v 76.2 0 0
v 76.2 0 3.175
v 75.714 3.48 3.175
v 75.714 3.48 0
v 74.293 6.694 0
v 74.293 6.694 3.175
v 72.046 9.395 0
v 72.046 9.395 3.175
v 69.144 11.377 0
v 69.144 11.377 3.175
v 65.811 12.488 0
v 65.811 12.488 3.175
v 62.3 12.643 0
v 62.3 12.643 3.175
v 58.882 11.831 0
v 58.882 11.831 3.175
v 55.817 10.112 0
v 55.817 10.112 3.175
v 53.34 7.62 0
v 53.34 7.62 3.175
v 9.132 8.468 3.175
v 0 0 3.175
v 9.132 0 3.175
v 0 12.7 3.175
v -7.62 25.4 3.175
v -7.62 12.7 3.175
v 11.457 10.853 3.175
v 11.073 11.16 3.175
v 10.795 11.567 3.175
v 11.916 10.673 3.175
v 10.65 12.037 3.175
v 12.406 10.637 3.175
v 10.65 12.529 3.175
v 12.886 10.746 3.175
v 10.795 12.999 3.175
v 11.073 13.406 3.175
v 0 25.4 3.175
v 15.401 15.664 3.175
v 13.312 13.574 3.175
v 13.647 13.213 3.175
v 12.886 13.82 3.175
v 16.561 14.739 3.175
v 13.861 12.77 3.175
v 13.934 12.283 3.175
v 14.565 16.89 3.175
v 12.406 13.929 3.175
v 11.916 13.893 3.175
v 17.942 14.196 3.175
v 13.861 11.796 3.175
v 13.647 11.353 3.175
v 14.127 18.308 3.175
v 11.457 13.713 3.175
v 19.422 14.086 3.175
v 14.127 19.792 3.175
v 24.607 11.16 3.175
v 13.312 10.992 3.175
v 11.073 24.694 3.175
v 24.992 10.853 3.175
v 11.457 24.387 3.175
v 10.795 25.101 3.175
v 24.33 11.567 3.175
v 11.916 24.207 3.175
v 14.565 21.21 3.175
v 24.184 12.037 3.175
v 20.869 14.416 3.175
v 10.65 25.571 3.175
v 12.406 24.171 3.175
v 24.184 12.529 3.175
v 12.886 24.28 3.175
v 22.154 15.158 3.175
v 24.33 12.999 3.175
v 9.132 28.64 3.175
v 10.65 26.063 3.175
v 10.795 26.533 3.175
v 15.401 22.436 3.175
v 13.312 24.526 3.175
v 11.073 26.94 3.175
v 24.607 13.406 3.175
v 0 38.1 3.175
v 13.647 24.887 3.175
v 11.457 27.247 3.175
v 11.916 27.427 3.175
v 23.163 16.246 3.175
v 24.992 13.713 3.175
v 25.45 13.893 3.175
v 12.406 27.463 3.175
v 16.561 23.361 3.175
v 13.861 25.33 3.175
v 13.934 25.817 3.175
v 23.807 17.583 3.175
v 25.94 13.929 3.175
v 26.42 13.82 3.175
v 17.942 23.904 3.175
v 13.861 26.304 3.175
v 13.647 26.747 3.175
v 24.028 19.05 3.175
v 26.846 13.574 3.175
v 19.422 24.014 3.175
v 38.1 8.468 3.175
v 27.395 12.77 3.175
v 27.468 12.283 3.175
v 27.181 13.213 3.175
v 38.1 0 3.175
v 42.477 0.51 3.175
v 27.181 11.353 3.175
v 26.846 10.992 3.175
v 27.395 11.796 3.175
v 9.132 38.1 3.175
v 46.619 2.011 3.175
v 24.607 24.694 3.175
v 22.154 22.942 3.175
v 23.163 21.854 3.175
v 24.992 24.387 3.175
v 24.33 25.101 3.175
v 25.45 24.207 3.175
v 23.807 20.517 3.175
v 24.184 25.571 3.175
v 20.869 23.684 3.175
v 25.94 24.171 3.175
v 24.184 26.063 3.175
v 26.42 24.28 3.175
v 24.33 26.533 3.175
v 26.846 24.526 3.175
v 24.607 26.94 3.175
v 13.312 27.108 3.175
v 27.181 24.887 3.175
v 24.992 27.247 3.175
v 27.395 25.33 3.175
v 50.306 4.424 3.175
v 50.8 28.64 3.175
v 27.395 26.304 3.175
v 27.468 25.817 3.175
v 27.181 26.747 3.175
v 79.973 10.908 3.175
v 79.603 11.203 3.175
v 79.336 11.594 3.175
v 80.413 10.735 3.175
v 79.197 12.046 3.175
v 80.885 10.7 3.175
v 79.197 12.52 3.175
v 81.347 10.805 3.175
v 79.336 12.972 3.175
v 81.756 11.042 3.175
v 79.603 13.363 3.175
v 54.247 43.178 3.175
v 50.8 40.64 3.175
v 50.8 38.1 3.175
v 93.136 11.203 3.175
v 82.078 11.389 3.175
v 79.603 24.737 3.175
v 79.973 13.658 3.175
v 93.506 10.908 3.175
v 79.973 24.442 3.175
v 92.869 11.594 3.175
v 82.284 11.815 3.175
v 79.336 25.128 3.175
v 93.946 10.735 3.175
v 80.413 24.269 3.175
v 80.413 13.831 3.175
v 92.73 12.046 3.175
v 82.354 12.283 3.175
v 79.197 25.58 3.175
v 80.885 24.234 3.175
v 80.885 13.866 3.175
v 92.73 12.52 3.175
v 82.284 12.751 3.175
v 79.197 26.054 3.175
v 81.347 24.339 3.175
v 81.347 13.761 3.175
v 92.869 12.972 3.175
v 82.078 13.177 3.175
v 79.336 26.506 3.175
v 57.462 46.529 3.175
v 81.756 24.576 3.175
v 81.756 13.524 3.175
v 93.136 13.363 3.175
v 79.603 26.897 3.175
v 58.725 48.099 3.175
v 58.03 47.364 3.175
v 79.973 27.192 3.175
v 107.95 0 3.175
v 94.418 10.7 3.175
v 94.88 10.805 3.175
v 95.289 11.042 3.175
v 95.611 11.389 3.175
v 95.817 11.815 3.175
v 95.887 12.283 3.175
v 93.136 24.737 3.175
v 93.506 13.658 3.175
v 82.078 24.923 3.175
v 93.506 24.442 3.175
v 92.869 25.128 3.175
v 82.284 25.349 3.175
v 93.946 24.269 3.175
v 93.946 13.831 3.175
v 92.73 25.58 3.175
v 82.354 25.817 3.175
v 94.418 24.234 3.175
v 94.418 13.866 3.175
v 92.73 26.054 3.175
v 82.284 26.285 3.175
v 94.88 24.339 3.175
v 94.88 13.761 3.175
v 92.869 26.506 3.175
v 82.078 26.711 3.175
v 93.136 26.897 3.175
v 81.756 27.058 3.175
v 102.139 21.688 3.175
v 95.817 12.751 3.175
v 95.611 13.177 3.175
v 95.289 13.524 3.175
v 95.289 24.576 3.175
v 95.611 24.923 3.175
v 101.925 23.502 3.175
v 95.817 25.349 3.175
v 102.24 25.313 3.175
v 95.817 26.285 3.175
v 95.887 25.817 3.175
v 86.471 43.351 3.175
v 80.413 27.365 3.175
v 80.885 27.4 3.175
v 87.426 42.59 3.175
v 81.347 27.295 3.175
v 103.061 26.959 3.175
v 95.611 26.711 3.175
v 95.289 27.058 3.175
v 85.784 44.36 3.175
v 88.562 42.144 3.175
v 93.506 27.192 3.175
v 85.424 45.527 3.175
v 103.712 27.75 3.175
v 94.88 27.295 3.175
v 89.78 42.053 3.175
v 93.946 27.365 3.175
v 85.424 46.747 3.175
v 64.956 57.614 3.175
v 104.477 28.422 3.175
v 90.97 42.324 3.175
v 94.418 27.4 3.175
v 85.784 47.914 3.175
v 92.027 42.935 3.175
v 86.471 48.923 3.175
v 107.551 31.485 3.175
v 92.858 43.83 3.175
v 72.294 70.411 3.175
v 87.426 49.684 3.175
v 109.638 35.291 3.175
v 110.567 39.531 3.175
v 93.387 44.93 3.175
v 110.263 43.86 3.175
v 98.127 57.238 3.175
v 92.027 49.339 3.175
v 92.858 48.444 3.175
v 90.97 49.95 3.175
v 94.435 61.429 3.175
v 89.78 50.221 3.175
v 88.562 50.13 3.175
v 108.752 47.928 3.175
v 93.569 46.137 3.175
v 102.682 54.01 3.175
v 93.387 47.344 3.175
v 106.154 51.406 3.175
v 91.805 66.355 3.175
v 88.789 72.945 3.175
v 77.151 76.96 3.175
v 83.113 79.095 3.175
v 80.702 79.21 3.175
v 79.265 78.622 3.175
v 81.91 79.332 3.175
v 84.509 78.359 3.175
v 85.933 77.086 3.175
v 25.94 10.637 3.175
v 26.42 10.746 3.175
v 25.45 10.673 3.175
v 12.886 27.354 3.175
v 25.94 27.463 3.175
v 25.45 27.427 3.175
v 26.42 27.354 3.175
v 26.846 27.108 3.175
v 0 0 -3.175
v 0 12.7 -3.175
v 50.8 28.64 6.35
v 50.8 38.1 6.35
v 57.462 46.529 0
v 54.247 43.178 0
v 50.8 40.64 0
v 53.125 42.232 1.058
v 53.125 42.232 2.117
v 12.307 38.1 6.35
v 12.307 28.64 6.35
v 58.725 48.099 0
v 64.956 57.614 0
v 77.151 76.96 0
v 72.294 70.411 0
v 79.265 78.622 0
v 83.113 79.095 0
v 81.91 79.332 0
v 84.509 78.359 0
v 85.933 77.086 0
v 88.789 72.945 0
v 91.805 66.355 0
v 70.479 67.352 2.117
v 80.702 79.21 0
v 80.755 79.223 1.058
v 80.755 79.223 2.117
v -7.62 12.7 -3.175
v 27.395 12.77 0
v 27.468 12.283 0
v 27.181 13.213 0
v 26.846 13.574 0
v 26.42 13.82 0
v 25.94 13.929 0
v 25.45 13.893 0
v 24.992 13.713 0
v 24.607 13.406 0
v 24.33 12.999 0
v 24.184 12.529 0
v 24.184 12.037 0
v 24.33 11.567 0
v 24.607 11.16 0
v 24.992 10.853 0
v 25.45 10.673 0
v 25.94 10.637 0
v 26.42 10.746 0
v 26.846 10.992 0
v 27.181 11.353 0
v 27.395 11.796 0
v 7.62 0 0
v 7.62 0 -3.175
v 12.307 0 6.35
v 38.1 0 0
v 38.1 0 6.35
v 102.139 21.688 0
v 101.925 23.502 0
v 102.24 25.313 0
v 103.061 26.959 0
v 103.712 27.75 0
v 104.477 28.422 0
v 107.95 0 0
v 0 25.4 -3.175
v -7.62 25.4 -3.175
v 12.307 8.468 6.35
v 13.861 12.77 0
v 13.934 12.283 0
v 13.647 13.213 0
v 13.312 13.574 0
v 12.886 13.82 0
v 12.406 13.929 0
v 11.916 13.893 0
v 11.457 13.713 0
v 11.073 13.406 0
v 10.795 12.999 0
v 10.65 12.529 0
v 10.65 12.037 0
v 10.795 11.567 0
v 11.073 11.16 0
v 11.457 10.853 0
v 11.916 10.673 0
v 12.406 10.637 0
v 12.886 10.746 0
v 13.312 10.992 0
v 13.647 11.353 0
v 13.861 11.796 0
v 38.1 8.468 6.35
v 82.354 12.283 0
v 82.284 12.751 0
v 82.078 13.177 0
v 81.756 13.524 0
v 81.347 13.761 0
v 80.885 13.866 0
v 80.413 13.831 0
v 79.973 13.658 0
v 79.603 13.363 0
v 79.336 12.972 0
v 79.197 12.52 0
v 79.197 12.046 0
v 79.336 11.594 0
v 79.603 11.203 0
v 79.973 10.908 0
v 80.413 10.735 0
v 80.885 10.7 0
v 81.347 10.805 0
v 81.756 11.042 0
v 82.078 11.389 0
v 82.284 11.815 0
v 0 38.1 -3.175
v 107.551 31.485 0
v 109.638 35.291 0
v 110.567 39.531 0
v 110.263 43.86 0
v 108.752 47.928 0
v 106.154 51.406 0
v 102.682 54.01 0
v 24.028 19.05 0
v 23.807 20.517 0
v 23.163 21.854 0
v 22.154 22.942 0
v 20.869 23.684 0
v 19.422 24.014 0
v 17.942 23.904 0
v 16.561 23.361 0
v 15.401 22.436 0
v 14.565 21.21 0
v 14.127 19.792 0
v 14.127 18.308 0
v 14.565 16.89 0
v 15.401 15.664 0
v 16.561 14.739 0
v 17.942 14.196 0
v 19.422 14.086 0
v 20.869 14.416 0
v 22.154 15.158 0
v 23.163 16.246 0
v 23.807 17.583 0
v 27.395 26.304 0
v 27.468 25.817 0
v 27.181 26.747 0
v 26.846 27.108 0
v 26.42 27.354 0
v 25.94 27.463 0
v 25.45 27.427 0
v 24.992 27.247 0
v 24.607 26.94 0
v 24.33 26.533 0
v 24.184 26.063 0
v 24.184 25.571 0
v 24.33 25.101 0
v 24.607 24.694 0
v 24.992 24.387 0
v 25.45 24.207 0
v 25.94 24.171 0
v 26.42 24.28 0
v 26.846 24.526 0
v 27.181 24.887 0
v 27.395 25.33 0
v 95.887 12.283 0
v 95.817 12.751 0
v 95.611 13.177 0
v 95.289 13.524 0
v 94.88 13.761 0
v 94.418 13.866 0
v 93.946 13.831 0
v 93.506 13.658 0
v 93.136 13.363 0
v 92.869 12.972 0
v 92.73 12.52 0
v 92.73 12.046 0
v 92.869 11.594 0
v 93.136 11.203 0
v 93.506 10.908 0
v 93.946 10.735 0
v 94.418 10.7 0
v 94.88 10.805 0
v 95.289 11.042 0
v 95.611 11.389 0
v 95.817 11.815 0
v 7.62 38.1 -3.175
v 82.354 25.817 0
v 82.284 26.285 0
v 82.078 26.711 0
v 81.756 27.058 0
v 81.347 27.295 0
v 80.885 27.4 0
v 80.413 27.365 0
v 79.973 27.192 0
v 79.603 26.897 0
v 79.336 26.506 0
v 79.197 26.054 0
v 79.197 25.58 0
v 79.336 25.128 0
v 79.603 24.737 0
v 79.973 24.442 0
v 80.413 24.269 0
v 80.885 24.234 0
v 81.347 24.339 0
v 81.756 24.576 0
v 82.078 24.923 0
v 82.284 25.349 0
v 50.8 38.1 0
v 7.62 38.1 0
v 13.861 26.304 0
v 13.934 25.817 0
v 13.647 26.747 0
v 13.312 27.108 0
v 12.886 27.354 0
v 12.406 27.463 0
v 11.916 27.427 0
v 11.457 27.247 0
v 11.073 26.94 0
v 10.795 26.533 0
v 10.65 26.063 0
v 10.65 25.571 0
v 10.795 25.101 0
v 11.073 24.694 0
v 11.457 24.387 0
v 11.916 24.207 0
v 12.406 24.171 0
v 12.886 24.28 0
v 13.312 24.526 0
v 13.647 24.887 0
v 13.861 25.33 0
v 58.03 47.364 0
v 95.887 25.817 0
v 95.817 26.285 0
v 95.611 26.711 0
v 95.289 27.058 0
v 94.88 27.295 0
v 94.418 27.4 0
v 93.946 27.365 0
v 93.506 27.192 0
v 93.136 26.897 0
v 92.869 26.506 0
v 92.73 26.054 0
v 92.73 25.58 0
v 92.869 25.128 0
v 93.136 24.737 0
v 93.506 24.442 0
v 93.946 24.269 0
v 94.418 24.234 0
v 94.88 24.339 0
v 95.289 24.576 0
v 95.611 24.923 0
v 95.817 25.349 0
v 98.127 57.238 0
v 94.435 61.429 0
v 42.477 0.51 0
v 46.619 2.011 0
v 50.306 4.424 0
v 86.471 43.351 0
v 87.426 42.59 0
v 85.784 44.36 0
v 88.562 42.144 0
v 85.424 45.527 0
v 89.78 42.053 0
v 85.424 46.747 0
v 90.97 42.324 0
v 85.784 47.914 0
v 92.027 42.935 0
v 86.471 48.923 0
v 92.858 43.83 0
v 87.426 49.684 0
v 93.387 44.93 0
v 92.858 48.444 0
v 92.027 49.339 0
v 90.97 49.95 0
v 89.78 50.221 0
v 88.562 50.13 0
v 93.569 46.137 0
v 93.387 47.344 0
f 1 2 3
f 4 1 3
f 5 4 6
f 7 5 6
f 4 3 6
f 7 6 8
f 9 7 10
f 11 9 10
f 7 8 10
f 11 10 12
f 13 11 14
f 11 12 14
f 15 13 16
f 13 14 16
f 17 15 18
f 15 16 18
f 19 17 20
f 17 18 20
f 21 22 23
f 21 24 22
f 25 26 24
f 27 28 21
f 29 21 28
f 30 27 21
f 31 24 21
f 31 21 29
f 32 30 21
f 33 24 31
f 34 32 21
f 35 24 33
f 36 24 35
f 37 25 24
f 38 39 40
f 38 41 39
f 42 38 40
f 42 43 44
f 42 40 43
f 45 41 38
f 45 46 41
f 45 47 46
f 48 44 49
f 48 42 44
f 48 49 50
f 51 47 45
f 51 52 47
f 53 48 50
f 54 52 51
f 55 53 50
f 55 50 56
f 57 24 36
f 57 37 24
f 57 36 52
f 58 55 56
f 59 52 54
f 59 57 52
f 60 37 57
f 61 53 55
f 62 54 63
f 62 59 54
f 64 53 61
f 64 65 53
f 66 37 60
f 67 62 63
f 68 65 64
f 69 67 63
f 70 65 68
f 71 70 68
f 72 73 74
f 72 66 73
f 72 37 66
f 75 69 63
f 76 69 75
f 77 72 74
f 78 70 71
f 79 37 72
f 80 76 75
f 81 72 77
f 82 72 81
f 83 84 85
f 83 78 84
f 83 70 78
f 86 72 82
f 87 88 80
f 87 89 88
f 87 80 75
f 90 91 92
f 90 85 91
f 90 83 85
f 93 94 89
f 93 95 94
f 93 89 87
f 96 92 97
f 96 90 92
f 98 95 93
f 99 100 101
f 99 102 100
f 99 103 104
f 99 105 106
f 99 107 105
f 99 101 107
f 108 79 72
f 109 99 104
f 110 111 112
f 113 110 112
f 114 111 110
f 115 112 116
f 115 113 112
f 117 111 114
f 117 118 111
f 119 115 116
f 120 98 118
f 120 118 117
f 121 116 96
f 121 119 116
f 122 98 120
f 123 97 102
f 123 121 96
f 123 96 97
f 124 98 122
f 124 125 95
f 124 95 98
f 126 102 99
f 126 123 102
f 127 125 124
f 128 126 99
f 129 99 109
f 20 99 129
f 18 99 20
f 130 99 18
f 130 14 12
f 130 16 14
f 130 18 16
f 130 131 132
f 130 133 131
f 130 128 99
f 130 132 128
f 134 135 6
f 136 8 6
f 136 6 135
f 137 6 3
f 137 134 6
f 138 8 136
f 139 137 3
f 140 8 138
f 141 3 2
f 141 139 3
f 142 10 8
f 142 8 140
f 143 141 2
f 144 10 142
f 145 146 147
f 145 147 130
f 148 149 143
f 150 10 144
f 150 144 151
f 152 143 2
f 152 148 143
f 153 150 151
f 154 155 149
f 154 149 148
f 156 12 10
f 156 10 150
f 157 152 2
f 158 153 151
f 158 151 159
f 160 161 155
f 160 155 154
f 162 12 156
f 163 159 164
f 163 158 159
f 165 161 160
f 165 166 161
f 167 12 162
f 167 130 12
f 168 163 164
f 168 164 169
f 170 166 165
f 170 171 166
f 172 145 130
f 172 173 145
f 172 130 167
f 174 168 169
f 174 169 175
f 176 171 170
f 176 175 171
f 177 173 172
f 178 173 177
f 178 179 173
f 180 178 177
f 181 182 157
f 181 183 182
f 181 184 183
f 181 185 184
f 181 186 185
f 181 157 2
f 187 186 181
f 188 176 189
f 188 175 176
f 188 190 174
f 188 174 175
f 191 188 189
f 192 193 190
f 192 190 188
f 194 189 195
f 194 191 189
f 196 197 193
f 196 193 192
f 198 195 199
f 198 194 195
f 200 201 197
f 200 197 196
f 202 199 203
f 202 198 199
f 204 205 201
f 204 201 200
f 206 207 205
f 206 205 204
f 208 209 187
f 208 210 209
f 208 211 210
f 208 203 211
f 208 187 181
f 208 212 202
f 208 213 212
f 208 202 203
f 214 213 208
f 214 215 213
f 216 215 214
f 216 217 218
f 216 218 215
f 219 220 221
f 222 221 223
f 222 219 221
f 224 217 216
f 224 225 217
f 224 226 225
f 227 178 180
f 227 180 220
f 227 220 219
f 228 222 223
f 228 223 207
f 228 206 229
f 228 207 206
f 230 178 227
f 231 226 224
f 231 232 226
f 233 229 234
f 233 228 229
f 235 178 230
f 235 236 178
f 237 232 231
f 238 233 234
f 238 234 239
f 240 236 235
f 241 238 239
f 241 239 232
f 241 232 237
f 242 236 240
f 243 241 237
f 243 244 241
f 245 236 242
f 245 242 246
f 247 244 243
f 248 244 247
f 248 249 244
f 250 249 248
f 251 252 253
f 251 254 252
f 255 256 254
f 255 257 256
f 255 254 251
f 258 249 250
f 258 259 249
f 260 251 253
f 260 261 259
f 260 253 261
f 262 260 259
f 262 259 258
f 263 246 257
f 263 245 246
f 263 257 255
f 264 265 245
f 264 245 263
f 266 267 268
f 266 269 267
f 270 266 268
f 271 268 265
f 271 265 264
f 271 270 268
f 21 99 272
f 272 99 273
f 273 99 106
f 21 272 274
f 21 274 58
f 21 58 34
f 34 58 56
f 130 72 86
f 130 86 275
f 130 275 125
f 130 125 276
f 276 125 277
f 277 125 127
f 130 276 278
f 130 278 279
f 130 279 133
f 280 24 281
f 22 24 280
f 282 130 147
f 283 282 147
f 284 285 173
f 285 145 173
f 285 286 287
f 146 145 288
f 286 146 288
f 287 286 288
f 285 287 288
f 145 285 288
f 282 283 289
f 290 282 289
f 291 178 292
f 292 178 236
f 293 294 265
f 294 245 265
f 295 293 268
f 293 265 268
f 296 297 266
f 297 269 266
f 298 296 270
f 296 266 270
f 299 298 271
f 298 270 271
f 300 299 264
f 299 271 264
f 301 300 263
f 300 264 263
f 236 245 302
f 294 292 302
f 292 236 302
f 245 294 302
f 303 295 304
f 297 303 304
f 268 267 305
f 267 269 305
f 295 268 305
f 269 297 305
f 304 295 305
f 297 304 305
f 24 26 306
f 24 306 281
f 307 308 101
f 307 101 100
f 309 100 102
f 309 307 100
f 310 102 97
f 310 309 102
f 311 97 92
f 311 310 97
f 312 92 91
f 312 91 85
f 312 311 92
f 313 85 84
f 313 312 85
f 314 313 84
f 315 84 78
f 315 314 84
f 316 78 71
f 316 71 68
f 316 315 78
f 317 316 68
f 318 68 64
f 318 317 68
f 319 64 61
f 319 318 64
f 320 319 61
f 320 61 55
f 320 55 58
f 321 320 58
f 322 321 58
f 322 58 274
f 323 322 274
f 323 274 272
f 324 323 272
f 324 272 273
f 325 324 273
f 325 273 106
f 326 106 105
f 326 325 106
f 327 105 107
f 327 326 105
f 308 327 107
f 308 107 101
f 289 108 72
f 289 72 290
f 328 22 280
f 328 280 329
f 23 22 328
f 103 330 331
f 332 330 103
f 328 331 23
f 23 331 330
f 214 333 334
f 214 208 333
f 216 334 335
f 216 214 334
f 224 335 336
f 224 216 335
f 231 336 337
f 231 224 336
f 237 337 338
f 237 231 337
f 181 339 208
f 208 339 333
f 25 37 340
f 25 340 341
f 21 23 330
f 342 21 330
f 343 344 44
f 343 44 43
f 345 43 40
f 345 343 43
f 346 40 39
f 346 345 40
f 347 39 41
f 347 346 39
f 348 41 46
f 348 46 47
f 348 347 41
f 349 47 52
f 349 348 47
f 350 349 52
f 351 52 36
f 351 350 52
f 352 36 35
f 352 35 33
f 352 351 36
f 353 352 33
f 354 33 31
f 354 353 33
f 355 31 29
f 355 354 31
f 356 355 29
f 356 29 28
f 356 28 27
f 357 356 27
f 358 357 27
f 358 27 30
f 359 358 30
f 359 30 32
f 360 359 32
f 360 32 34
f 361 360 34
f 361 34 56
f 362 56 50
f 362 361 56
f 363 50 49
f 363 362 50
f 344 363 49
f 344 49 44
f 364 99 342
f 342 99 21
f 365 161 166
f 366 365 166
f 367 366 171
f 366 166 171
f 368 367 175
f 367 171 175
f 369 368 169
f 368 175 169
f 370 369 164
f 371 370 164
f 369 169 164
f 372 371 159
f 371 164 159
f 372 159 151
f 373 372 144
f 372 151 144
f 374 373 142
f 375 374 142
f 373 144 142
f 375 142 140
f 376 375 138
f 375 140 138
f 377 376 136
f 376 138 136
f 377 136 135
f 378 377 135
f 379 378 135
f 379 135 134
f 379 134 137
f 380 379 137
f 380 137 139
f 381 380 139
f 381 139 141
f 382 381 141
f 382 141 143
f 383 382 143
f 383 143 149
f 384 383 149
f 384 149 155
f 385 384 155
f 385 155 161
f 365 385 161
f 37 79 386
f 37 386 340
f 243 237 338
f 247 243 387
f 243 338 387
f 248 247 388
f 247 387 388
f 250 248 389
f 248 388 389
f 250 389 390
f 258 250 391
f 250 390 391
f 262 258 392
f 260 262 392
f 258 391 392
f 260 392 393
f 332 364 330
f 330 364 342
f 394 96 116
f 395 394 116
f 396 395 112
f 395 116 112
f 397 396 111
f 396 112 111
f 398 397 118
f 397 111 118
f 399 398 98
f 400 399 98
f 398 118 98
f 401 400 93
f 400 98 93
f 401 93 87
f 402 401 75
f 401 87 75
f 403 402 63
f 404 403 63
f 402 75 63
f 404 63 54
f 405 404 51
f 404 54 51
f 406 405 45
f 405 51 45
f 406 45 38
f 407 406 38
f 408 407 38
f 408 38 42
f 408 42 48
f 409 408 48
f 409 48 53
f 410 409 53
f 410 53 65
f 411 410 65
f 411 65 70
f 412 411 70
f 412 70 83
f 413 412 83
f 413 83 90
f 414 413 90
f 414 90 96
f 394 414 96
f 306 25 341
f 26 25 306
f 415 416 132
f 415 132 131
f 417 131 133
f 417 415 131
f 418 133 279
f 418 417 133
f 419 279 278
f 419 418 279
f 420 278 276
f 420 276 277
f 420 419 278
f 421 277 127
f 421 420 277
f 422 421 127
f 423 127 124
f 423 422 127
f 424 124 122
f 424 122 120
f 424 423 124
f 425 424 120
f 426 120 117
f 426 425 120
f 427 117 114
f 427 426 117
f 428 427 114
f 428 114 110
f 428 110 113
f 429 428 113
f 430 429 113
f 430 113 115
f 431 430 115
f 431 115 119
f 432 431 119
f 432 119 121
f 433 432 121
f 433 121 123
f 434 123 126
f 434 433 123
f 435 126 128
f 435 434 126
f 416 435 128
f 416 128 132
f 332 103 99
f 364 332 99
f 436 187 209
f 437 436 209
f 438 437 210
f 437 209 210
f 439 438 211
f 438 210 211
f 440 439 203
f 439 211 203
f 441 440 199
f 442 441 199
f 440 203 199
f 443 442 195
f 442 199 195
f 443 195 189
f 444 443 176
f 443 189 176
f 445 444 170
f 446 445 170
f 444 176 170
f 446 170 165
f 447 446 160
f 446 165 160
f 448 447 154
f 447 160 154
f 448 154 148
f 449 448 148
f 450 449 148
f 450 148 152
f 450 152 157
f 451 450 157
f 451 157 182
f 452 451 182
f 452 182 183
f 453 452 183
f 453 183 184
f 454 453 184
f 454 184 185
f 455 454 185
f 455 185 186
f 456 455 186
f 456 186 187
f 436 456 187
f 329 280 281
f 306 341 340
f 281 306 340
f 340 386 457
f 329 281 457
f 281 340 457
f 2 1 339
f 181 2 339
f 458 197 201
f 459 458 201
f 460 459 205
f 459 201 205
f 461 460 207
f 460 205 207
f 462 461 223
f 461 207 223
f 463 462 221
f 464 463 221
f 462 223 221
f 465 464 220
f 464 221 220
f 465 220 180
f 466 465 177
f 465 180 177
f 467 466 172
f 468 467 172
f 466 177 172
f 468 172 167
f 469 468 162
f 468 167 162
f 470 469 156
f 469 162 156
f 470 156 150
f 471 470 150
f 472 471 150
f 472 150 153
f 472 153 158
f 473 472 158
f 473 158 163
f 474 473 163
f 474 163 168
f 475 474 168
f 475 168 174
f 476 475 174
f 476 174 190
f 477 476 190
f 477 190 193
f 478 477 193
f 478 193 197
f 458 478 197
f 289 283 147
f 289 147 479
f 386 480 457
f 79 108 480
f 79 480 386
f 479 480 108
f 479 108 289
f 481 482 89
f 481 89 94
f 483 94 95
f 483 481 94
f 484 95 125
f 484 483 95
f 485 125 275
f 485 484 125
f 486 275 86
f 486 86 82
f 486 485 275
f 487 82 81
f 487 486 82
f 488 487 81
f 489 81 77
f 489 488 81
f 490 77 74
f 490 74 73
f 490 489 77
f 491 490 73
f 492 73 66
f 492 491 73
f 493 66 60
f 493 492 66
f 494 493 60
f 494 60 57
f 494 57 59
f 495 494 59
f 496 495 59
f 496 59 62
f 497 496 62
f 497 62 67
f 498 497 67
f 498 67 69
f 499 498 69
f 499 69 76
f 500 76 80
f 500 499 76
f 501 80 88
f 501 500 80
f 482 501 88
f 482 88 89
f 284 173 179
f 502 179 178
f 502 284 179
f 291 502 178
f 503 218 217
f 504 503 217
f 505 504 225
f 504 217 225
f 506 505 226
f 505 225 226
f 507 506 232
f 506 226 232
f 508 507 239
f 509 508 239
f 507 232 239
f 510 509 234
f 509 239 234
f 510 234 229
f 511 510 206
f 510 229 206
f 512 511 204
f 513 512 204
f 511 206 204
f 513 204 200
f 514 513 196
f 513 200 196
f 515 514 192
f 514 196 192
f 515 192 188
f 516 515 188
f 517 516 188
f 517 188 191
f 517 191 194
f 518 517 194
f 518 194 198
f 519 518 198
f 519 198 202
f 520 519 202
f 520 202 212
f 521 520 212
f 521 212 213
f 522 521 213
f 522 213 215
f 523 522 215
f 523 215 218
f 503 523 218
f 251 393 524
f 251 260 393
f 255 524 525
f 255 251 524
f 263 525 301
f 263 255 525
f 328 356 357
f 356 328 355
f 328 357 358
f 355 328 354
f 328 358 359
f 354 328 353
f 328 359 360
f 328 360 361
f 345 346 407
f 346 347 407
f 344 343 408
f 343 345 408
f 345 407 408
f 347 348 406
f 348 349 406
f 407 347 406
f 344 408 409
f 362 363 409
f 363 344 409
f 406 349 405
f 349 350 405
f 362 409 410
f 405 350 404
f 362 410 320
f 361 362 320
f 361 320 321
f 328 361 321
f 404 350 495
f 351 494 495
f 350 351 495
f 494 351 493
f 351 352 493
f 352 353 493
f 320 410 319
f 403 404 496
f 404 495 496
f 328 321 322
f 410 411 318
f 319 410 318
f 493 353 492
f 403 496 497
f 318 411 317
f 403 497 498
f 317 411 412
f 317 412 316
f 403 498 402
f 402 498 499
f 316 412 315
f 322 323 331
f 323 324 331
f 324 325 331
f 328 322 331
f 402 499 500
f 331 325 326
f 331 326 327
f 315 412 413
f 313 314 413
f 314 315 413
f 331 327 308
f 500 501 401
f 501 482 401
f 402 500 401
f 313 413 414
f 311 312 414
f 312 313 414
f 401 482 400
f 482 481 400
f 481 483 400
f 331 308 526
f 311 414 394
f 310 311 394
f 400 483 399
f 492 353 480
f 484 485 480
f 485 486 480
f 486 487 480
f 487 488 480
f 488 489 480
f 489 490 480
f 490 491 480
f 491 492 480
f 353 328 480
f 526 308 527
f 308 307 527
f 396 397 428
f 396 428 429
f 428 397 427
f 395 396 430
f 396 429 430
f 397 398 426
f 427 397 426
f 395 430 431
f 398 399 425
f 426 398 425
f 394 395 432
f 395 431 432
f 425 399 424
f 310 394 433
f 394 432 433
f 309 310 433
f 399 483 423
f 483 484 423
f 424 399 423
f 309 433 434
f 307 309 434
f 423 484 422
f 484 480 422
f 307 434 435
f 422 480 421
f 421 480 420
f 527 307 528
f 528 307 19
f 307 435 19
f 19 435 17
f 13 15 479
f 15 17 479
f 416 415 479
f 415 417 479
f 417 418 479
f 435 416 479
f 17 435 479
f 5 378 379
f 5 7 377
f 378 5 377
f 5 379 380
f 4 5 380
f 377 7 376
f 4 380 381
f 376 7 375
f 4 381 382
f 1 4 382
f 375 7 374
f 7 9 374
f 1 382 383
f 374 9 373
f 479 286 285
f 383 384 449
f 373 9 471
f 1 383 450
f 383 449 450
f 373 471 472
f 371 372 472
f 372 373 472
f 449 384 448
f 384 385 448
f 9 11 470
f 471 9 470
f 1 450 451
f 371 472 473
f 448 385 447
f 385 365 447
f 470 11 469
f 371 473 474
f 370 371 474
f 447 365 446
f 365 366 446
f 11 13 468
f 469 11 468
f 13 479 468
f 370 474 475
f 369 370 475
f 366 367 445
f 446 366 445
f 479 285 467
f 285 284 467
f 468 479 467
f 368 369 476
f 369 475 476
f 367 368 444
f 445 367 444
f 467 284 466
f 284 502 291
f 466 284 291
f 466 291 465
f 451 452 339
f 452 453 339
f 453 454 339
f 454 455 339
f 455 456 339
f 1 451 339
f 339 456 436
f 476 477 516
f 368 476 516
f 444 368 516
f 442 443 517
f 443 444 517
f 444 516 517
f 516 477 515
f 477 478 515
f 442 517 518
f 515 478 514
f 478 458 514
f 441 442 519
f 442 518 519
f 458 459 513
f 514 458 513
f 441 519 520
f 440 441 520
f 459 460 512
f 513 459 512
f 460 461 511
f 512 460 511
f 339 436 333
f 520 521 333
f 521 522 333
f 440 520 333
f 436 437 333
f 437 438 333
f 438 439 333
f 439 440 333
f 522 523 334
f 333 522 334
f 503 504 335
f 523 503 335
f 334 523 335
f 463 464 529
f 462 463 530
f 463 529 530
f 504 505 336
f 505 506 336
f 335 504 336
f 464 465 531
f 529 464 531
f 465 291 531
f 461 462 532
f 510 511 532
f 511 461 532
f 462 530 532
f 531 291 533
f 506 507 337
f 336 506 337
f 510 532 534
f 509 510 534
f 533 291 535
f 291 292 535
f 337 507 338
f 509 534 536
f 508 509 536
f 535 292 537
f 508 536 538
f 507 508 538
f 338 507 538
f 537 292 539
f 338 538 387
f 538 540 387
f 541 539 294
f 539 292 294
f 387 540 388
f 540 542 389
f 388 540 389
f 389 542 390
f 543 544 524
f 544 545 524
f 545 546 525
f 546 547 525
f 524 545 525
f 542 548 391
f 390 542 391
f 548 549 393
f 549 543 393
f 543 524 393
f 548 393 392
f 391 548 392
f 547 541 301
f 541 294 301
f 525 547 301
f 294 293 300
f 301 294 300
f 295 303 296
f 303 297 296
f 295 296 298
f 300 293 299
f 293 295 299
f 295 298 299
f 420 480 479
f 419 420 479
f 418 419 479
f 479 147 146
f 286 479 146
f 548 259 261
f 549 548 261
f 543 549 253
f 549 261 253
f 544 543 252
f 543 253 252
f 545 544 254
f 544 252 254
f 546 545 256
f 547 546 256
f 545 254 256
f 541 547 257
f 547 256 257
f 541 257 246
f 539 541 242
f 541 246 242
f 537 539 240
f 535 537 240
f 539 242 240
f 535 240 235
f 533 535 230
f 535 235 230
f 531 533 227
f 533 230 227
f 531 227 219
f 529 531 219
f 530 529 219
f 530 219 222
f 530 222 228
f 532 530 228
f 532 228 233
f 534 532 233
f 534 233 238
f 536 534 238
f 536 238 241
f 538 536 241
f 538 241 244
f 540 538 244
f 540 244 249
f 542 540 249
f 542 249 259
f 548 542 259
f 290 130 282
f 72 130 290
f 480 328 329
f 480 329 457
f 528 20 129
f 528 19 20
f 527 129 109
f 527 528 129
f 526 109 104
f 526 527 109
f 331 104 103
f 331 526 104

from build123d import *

# Parameters (mm, degrees)
SKETCH1_R           = 1.651
BOSS_EXTRUDE1_DEPTH = 3.175
CUT_EXTRUDE2_DEPTH  = 6.35
SKETCH7_R           = 4.9784
SKETCH7_R_2         = 1.5875
CUT_EXTRUDE3_DEPTH  = 124.96234811
FILLET1_R           = 6.35
SKETCH8_W           = 50.8
SKETCH8_H           = 12.7
CUT_EXTRUDE4_DEPTH  = 50.8
CUT_EXTRUDE5_DEPTH  = 19.304
FILLET6_R           = 6.35
FILLET7_R           = 6.35
FILLET8_R           = 19.05
BOSS_EXTRUDE2_DEPTH = 3.175
FILLET9_R           = 24.13
SKETCH13_W          = 41.667851519
SKETCH13_H          = 9.459584315
SKETCH13_W_2        = 28.967851519
SKETCH13_H_2        = 8.468235606
BOSS_EXTRUDE3_DEPTH = 6.35
SKETCH16_R          = 4.09575
CUT_EXTRUDE8_DEPTH  = 137.155378763
BOSS_EXTRUDE4_DEPTH = 6.35
CUT_EXTRUDE9_DEPTH  = 119.214793194


with BuildPart() as part:
    # Sketch1 → Boss-Extrude1 (new body)
    with BuildSketch(Plane.XY):
        with BuildLine():
            Line((0, 0), (107.95, 0))
            Line((107.95, 0), (100.9362606, 26.175631792))
            Line((100.9362606, 26.175631792), (100.868755024, 26.427566033))
            ThreePointArc((100.868755024, 26.427566033), (110.348359368, 43.438223217), (95.367453293, 55.88))
            Line((95.367453293, 55.88), (0, 38.1))
            Line((0, 38.1), (0, 25.4))
            Line((0, 25.4), (-7.62, 25.4))
            Line((-7.62, 25.4), (-7.62, 12.7))
            Line((-7.62, 12.7), (0, 12.7))
            Line((0, 12.7), (0, 0))
        make_face()
        with Locations((25.817011896, 25.817011896)):
            Circle(SKETCH1_R, mode=Mode.SUBTRACT)
        with Locations((25.817011896, 12.282988104)):
            Circle(SKETCH1_R, mode=Mode.SUBTRACT)
        with Locations((12.282988104, 12.282988104)):
            Circle(SKETCH1_R, mode=Mode.SUBTRACT)
        with Locations((12.282988104, 25.817011896)):
            Circle(SKETCH1_R, mode=Mode.SUBTRACT)
    extrude(amount=BOSS_EXTRUDE1_DEPTH)

    # Sketch6 → Cut-Extrude2 (cut)
    with BuildSketch(Plane.XY.offset(3.175)):
        with BuildLine():
            Line((50.8, 0), (76.2, 0))
            ThreePointArc((76.2, 0), (63.5, 12.7), (50.8, 0))
        make_face()
    extrude(amount=-CUT_EXTRUDE2_DEPTH, mode=Mode.SUBTRACT)

    # Sketch7 → Cut-Extrude3 (cut, through all)
    with BuildSketch(Plane.XY.offset(3.175)):
        with Locations((19.05, 19.05)):
            Circle(SKETCH7_R)
        with Locations((80.766582748, 12.282988104)):
            Circle(SKETCH7_R_2)
        with Locations((94.299702748, 12.282988104)):
            Circle(SKETCH7_R_2)
        with Locations((80.766582748, 25.817011896)):
            Circle(SKETCH7_R_2)
        with Locations((94.299702748, 25.817011896)):
            Circle(SKETCH7_R_2)
    extrude(amount=-CUT_EXTRUDE3_DEPTH, mode=Mode.SUBTRACT)

    # Fillet1
    fillet1_edges = [part.edges().sort_by_distance(p)[0] for p in [
        (100.868755024, 26.427566033, 1.5875),
    ]]
    fillet(fillet1_edges, radius=FILLET1_R)

    # Sketch8 → Cut-Extrude4 (cut)
    with BuildSketch(Plane.XY.offset(3.175)):
        with Locations((25.4, 44.45)):
            Rectangle(SKETCH8_W, SKETCH8_H)
    extrude(amount=-CUT_EXTRUDE4_DEPTH, mode=Mode.SUBTRACT)

    # Sketch9 → Cut-Extrude5 (cut)
    with BuildSketch(Plane.XY.offset(3.175)):
        Polygon((50.8, 47.57098794), (50.8, 40.64), (57.15, 40.64), (57.15, 48.754861432), align=None)
    extrude(amount=-CUT_EXTRUDE5_DEPTH, mode=Mode.SUBTRACT)

    # Fillet6
    fillet6_edges = [part.edges().sort_by_distance(p)[0] for p in [
        (57.15, 40.64, 1.5875),
    ]]
    fillet(fillet6_edges, radius=FILLET6_R - 0.0001)  # a hair under: the kernel refuses the full size

    # Fillet7
    fillet7_edges = [part.edges().sort_by_distance(p)[0] for p in [
        (57.15, 48.754861432, 1.5875),
    ]]
    fillet(fillet7_edges, radius=FILLET7_R)

    # Fillet8
    fillet8_edges = [part.edges().sort_by_distance(p)[0] for p in [
        (50.8, 0, 1.5875),
    ]]
    fillet(fillet8_edges, radius=FILLET8_R)

    # Sketch12 → Boss-Extrude2 (add)
    with BuildSketch(Plane.XY.offset(3.175)):
        with BuildLine():
            Line((50.8, 40.64), (85.027112904, 40.64))
            Line((85.027112904, 40.64), (95.367453293, 55.88))
            add(Edge.make_bspline(
                [(50.8, 40.64), (70.777788932, 52.178803671), (78.594281742, 111.543427795), (95.367453293, 55.88)],
                knots=[0, 0, 0, 0, 1, 1, 1, 1], degree=3))
        make_face()
    extrude(amount=-BOSS_EXTRUDE2_DEPTH)

    # Fillet9
    fillet9_edges = [part.edges().sort_by_distance(p)[0] for p in [
        (95.367453293, 55.88, 1.5875),
    ]]
    fillet(fillet9_edges, radius=FILLET9_R)

    # Sketch13 → Boss-Extrude3 (add)
    with BuildSketch(Plane(origin=(0, 0, 0), x_dir=(-1, 0, 0), z_dir=(0, 0, -1))):
        with Locations((-29.966074241, 33.370207843)):
            Rectangle(SKETCH13_W, SKETCH13_H)
        with Locations((-23.616074241, 4.234117803)):
            Rectangle(SKETCH13_W_2, SKETCH13_H_2)
    extrude(amount=-BOSS_EXTRUDE3_DEPTH)

    # Sketch16 → Cut-Extrude8 (cut, through all)
    with BuildSketch(Plane.XY.offset(3.175)):
        with Locations((89.473702748, 46.137011896)):
            Circle(SKETCH16_R)
    extrude(amount=-CUT_EXTRUDE8_DEPTH, mode=Mode.SUBTRACT)

    # Sketch18 → Boss-Extrude4 (add)
    with BuildSketch(Plane.XY.offset(3.175)):
        Polygon((0, 0), (7.62, 0), (7.62, 38.1), (0, 38.1), (0, 25.4), (-7.62, 25.4), (-7.62, 12.7), (0, 12.7), align=None)
    extrude(amount=-BOSS_EXTRUDE4_DEPTH)

    # Sketch19 → Cut-Extrude9 (cut, through all)
    with BuildSketch(Plane(origin=(0, 38.1, 0), x_dir=(1, 0, 0), z_dir=(0, 1, 0))):
        Polygon((9.132148481, -3.175), (12.307148481, -6.35), (9.132148481, -6.35), align=None)
    extrude(amount=-CUT_EXTRUDE9_DEPTH, mode=Mode.SUBTRACT)


solid = part.part
